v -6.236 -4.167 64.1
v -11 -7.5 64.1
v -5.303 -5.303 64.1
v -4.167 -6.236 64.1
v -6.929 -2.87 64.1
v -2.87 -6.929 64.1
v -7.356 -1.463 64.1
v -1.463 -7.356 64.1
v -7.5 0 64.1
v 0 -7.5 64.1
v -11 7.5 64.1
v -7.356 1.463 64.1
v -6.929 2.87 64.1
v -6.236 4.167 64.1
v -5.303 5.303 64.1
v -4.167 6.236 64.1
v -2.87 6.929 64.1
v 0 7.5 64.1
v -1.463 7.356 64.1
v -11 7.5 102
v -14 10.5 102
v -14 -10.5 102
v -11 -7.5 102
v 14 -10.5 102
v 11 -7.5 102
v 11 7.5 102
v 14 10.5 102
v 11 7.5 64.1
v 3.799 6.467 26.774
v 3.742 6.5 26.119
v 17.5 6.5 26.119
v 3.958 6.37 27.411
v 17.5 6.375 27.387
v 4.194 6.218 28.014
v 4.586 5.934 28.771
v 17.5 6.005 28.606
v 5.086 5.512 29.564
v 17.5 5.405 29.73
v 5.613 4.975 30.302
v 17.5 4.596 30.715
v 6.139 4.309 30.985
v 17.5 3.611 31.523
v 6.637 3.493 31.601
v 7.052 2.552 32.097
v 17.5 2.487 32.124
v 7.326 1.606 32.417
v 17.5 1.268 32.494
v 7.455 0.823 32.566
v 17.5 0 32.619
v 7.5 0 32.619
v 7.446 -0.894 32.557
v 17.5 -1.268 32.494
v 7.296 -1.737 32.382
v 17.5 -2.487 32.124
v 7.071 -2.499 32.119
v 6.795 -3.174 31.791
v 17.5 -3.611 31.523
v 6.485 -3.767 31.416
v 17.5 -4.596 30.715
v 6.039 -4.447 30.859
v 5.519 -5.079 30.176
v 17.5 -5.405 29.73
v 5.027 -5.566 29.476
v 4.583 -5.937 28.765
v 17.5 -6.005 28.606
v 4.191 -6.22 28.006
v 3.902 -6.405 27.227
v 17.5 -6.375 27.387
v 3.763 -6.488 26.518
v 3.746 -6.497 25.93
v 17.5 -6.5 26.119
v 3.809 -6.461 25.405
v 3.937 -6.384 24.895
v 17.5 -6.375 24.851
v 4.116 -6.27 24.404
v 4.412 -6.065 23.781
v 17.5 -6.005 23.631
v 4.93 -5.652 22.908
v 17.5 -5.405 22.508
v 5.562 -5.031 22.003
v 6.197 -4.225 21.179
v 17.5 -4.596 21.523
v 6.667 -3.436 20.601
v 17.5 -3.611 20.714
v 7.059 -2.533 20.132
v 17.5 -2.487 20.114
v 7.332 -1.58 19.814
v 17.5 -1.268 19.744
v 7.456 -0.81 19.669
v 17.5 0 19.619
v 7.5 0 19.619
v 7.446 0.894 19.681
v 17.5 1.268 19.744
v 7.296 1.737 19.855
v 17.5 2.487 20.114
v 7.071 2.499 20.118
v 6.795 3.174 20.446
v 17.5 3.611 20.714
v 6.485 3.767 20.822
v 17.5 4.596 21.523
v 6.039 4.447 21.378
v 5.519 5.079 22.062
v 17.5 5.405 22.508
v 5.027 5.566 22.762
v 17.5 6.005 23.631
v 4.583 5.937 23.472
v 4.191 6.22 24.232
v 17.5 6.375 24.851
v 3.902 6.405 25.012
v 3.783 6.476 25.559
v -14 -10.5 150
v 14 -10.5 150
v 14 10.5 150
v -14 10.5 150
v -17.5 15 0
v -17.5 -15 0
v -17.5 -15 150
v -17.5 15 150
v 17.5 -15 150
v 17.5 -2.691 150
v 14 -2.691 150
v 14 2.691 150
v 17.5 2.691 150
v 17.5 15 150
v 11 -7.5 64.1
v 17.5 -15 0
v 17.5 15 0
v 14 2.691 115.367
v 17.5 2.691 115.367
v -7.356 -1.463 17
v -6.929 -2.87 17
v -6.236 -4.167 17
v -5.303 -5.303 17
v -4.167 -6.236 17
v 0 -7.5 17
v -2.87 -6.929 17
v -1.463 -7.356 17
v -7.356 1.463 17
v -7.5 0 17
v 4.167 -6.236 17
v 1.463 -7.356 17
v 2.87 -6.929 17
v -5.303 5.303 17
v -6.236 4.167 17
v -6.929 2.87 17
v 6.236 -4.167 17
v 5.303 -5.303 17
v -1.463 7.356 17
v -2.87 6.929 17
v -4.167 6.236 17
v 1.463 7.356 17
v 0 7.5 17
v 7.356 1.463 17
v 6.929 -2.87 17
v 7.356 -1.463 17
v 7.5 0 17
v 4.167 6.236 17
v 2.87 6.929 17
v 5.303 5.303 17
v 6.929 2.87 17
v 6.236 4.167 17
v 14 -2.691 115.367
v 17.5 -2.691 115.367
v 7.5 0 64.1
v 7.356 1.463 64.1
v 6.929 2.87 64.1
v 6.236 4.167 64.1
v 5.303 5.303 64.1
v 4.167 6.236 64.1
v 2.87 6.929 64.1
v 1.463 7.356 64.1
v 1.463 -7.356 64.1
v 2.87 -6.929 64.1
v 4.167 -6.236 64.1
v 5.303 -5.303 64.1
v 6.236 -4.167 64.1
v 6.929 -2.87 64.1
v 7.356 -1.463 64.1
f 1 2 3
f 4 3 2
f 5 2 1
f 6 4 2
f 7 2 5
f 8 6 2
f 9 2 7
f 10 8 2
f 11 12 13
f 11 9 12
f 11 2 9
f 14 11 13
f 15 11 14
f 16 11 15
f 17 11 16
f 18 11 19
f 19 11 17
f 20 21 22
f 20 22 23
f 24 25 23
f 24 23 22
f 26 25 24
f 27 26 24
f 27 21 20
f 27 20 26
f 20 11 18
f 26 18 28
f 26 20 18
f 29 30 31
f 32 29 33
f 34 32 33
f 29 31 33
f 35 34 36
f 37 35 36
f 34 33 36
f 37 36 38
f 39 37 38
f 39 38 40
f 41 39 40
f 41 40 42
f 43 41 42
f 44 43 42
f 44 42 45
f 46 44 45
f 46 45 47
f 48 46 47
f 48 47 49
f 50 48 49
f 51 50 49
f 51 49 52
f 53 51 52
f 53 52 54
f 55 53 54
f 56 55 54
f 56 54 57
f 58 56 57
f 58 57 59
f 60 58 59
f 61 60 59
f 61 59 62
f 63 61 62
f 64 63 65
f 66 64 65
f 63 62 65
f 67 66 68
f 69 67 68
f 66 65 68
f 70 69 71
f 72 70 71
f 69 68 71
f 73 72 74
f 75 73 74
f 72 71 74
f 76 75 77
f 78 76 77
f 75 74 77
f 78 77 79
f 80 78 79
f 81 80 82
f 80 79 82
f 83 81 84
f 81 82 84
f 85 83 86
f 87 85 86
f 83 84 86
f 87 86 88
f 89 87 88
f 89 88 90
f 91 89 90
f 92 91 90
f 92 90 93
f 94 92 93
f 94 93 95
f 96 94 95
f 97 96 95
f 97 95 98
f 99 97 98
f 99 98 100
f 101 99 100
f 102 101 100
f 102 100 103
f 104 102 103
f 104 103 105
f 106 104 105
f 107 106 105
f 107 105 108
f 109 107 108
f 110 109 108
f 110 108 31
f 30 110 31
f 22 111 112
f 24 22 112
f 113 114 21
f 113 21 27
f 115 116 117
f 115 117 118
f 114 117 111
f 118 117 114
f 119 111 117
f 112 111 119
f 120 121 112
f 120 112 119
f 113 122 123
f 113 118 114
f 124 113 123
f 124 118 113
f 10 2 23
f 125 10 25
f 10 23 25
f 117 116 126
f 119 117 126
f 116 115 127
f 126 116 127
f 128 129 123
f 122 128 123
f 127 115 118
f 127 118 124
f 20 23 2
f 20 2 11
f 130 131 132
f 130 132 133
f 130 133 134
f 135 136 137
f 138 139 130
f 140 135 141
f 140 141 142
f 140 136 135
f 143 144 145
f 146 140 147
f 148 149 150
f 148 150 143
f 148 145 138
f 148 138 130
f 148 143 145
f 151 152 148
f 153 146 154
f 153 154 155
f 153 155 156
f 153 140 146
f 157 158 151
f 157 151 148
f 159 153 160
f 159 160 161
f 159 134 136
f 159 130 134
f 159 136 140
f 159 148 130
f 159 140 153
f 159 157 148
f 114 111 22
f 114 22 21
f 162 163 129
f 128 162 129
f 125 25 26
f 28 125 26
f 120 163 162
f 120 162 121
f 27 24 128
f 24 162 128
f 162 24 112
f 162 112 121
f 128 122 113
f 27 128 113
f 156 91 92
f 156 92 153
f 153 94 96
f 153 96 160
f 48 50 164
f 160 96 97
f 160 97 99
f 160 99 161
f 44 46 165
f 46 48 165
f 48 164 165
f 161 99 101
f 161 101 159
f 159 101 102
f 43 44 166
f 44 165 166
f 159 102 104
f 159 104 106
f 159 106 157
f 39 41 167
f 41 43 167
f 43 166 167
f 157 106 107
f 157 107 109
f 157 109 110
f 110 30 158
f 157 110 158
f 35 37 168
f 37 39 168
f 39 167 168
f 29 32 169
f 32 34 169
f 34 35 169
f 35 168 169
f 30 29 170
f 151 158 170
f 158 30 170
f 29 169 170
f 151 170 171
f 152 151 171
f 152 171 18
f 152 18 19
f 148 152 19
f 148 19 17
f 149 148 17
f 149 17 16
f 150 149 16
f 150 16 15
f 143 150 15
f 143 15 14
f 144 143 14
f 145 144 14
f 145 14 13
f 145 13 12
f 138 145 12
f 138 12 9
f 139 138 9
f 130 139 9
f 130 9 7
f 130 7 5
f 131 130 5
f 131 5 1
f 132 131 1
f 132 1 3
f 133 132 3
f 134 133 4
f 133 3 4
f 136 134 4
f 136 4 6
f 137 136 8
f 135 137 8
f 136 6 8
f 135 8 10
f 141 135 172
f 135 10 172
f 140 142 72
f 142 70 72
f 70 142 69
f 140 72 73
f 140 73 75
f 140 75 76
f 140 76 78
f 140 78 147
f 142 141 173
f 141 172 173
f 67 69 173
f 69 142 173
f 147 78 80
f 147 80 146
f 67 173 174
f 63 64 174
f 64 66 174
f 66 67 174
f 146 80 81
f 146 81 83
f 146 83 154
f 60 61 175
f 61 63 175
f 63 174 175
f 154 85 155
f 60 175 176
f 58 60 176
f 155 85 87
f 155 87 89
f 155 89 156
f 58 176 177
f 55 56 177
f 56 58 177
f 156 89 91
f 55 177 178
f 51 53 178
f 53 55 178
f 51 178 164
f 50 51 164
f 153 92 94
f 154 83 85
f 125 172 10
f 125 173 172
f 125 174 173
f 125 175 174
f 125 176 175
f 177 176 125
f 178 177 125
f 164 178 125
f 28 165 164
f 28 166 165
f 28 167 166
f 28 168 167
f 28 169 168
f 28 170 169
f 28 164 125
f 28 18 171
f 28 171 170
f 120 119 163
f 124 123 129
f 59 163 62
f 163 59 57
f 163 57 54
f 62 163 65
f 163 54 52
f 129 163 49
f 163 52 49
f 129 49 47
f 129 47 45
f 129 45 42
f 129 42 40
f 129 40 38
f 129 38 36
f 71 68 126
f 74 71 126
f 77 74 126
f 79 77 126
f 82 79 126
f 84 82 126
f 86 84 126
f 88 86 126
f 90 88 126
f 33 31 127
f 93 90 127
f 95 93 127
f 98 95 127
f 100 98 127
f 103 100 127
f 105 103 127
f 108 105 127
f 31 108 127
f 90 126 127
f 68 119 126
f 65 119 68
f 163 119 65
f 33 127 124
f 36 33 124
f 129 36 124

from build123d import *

# Parameters (mm, degrees)
F0_W      = 35
F0_H      = 30
F1_DEPTH  = 150
F2_W      = 28
F2_H      = 21
F3_DEPTH  = 48
F4_W      = 22
F4_H      = 15
F5_DEPTH  = 85.9
F6_R      = 6.5
F7_DEPTH  = 15
F9_W      = 5.382292
F9_H      = 69.969817
F10_DEPTH = 5
F11_R     = 7.5
F12_DEPTH = 133


with BuildPart() as f1:
    # F0 (on Top) → F1 (new body)
    with BuildSketch(Plane.XY):
        Rectangle(F0_W, F0_H)
    extrude(amount=F1_DEPTH)

    # F2 (on face) → F3 (cut)
    with BuildSketch(Plane.XY.offset(150)):
        Rectangle(F2_W, F2_H)
    extrude(amount=-F3_DEPTH, mode=Mode.SUBTRACT)

    # F4 (on face) → F5 (cut)
    with BuildSketch(Plane.XY.offset(150)):
        Rectangle(F4_W, F4_H)
    extrude(amount=-F5_DEPTH, mode=Mode.SUBTRACT)

    # F6 (on face) → F7 (cut)
    with BuildSketch(Plane.YZ.offset(17.5)):
        with Locations((0, 26.118774)):
            Circle(F6_R)
    extrude(amount=-F7_DEPTH, mode=Mode.SUBTRACT)

    # F9 (on face) → F10 (cut)
    with BuildSketch(Plane.YZ.offset(17.5)):
        with Locations((0, 150.352105)):
            Rectangle(F9_W, F9_H)
    extrude(amount=-F10_DEPTH, mode=Mode.SUBTRACT)

    # F11 (on face) → F12 (cut)
    with BuildSketch(Plane.XY.offset(150)):
        Circle(F11_R)
    extrude(amount=-F12_DEPTH, mode=Mode.SUBTRACT)


solid = f1.part
